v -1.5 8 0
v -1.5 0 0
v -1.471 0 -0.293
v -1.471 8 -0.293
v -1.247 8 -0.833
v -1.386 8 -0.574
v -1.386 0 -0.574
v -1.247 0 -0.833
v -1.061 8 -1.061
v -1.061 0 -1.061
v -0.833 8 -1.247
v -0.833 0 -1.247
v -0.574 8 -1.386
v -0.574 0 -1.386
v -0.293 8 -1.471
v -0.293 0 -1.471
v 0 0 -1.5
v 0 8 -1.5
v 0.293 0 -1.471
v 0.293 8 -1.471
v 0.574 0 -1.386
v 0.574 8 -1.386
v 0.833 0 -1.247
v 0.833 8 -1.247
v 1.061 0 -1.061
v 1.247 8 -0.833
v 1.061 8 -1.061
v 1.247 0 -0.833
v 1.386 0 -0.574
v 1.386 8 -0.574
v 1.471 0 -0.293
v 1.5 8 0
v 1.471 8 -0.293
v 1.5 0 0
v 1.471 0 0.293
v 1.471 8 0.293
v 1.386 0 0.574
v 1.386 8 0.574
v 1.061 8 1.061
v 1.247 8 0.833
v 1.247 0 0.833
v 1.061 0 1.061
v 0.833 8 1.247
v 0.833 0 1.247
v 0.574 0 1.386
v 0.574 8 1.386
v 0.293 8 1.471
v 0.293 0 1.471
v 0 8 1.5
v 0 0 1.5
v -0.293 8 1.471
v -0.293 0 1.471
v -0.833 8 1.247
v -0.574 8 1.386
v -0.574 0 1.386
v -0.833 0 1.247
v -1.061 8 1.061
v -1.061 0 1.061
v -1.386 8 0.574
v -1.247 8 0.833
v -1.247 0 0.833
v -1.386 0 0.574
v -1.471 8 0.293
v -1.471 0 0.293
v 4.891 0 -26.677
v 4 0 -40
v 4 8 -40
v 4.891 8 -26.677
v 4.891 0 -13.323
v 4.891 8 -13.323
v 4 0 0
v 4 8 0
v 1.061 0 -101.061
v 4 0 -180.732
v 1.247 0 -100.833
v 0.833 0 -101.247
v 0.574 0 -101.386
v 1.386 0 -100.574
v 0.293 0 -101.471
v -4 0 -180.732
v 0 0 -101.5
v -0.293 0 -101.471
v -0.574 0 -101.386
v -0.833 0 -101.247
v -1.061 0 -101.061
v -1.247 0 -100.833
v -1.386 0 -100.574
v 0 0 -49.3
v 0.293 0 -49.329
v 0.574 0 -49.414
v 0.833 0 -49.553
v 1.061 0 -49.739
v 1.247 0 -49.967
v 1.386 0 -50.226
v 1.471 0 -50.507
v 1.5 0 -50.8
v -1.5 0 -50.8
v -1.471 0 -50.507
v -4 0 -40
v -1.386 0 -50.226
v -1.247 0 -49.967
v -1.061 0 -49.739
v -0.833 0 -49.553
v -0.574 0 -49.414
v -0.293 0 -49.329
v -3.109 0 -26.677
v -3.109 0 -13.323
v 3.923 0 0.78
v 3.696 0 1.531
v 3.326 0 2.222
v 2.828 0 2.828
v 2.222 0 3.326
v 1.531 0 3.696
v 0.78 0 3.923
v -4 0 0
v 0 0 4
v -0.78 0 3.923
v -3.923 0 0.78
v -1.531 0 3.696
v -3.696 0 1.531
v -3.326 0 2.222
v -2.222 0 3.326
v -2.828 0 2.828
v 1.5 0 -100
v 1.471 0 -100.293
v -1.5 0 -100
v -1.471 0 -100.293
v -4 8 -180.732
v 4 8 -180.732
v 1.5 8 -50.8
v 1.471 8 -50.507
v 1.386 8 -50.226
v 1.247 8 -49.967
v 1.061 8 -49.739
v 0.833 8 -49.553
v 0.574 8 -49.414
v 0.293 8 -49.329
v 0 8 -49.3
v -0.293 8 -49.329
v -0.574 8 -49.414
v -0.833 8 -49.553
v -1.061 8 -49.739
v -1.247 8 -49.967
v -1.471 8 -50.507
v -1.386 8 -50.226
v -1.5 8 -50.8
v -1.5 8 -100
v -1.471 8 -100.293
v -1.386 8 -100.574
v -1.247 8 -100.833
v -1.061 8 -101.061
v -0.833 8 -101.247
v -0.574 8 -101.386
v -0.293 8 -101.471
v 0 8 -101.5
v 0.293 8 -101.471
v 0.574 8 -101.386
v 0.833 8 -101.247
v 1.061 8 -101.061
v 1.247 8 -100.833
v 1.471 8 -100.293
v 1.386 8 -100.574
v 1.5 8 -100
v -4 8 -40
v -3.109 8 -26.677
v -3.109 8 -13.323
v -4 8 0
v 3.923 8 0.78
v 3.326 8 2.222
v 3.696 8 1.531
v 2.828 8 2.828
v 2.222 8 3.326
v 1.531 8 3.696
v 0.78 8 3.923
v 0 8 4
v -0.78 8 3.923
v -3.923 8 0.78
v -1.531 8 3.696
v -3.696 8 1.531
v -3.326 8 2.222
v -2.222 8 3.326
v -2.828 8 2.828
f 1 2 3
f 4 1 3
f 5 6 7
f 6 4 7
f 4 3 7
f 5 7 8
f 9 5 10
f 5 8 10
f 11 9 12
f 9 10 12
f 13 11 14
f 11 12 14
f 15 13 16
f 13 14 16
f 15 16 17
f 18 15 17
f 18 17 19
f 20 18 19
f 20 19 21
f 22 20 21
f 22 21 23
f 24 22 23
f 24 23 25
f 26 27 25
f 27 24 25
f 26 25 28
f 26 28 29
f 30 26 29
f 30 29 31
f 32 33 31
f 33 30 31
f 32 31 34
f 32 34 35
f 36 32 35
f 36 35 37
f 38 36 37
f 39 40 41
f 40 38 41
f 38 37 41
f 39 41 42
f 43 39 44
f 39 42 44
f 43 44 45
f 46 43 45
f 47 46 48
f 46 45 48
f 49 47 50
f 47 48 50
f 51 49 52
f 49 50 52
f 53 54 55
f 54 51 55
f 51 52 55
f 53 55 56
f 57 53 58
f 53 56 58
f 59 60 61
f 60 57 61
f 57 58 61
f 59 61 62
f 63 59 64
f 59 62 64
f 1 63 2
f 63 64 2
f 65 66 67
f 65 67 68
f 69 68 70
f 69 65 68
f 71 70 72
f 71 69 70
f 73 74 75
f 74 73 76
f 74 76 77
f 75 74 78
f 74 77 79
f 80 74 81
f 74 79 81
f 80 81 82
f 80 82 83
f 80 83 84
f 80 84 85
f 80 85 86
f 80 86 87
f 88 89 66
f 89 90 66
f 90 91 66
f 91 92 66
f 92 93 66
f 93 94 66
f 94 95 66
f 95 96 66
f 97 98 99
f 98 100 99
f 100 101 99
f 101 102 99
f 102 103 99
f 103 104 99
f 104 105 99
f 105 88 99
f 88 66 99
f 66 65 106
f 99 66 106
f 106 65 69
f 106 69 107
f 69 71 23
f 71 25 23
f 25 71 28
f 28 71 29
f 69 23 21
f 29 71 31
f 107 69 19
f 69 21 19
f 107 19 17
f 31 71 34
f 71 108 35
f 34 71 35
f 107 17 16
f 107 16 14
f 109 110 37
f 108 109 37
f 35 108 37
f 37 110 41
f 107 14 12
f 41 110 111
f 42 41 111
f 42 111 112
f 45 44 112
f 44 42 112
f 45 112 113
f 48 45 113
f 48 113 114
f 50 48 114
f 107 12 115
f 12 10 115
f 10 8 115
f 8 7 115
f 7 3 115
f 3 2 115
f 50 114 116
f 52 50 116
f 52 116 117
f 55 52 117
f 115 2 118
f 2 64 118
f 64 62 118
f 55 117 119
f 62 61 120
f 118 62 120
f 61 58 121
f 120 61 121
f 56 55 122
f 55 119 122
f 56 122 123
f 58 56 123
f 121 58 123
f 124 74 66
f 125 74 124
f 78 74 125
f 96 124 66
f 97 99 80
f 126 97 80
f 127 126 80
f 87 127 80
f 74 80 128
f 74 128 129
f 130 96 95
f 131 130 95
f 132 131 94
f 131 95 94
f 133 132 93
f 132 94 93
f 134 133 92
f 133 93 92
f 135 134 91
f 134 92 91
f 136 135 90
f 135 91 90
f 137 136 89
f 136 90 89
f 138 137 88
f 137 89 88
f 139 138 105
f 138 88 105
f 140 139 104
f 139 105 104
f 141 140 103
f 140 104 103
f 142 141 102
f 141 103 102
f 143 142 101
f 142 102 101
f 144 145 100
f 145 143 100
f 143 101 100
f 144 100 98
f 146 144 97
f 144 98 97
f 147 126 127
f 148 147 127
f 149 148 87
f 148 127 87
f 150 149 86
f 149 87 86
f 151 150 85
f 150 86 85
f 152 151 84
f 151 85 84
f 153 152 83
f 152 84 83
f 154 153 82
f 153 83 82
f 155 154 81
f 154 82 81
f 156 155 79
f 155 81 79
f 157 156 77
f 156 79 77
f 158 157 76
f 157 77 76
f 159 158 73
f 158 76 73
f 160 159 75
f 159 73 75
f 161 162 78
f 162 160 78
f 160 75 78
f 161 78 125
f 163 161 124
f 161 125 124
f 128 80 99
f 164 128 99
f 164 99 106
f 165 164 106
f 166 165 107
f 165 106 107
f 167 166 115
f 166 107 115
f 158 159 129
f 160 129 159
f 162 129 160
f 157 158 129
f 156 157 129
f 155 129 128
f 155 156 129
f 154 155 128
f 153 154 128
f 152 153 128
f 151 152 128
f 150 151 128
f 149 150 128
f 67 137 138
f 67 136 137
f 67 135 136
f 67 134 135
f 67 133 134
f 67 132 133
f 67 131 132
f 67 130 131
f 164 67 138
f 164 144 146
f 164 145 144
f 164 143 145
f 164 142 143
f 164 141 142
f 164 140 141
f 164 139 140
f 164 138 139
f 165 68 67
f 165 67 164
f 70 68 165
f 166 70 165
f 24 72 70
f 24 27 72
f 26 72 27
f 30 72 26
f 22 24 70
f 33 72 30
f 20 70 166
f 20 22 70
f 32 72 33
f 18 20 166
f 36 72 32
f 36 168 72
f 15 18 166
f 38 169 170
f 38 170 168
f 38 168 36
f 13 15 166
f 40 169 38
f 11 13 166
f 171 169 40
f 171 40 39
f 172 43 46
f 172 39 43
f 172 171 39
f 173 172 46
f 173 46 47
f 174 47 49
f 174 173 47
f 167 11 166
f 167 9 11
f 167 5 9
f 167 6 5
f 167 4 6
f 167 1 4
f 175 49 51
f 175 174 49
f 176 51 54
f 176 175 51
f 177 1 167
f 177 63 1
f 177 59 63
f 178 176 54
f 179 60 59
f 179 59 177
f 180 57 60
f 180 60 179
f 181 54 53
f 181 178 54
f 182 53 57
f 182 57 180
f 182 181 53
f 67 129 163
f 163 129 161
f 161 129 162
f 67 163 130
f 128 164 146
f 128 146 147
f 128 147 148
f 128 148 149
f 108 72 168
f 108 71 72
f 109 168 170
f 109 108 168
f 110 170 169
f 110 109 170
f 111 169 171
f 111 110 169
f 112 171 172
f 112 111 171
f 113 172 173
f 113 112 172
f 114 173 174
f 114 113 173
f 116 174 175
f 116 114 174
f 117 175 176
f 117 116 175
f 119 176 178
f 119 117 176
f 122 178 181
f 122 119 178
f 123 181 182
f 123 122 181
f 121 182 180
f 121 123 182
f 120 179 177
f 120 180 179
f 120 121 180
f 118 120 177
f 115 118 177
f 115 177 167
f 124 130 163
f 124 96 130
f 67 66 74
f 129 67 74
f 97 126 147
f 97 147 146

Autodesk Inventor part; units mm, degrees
ref_plane "XZ Plane" through (0, 0, 0) normal (0, 1, 0) x (-1, 0, 0)
ref_plane "XY Plane" through (0, 0, 0) normal (0, 0, 1) x (1, 0, 0)
sketch "Sketch1" plane through (0, 0, 0) normal (0, 1, 0) x (-1, 0, 0)
  line L0 (0, 0) -> (0, -319.927) construction
  line L1 (-4, 0) -> (-4, -319.927)
  line L2 (4, -319.927) -> (4, 0)
  arc A0 (4, 0) -> (-4, 0) centre (0, 0) ccw
  arc A1 (-4, -319.927) -> (4, -319.927) centre (0, -319.927) ccw
  circle A2 centre (0, 0) radius 1.5
  circle A3 centre (0, -319.927) radius 1.5
  line L3 (0, -50.8) -> (0, -100) construction
  line L4 (-1.5, -50.8) -> (-1.5, -100)
  line L5 (1.5, -100) -> (1.5, -50.8)
  arc A4 (1.5, -50.8) -> (-1.5, -50.8) centre (0, -50.8) ccw
  arc A5 (-1.5, -100) -> (1.5, -100) centre (0, -100) ccw
  arc A6 (4, 0) -> (4, -40) centre (202.9975, -20) ccw
  arc A7 (-4, 0) -> (-4, -40) centre (194.9975, -20) ccw
  point P0 (0, -159.9635)
  point P1 (0, -75.4)
  dimension "d0" = 319.927
  dimension "d1" = 8
  dimension "d2" = 3
  dimension "d3" = 3
  dimension "d12" = 3
  dimension "d13" = 50.8
  dimension "d14" = 100
  dimension "d15" = 40
  dimension "d16" = 200
  dimension "d17" = 200
extrude "Extrusion1" add sketch "Sketch1" along normal blind 8 contours A0 A6 L2 A1 L1 | L1 A7
sketch "Sketch2" plane through (0, 0, 0) normal (0, -1, 0) x (1, 0, 0)
  arc A0 (4, -40) -> (4, 0) centre (-194.9975, -20) ccw projected
  arc A1 (4, 0) -> (-4, 0) centre (0, 0) ccw projected
  arc A2 (-4, -40) -> (-4, 0) centre (-202.9975, -20) ccw projected
  line L0 (-4, -319.927) -> (-4, -40) projected
  arc A3 (-4, -319.927) -> (4, -319.927) centre (0, -319.927) ccw projected
  line L1 (4, -40) -> (4, -319.927) projected
  circle A4 centre (0, 0) radius 1.5 projected
  circle A5 centre (0, -319.927) radius 1.5 projected
  arc A6 (1.5, -50.8) -> (-1.5, -50.8) centre (0, -50.8) ccw projected
  line L2 (1.5, -100) -> (1.5, -50.8) projected
  arc A7 (-1.5, -100) -> (1.5, -100) centre (0, -100) ccw projected
  line L3 (-1.5, -50.8) -> (-1.5, -100) projected
sketch "Sketch3" plane through (0, 8, 0) normal (0, 1, 0) x (1, 0, 0)
  line L0 (-21.634, 180.7321) -> (39.8396, 180.7321)
  line L1 (39.8396, 180.7321) -> (39.8396, -20.7362)
  line L2 (39.8396, -20.7362) -> (-21.634, -20.7362)
  line L3 (-21.634, -20.7362) -> (-21.634, 180.7321)
  line L4 (-50.5628, 342.9399) -> (62.0528, 342.9399)
  line L5 (62.0528, 342.9399) -> (62.0528, -55.3474)
  line L6 (62.0528, -55.3474) -> (-50.5628, -55.3474)
  line L7 (-50.5628, -55.3474) -> (-50.5628, 342.9399)
  point P0 (0, 0)
extrude "Extrusion2" cut sketch "Sketch3" along normal mid plane 20
sketch "Sketch4" plane through (0, 8, 0) normal (0, 1, 0) x (1, 0, 0)
  line L0 (4, 180.7321) -> (-4, 180.7321) projected
  line L1 (-4, 180.7321) -> (-4, 40) projected
  arc A0 (-4, 0) -> (-4, 40) centre (-202.9975, 20) ccw projected
  arc A1 (-4, 0) -> (4, 0) centre (0, 0) ccw projected
  arc A2 (4, 0) -> (4, 40) centre (-194.9975, 20) ccw projected
  line L2 (4, 40) -> (4, 180.7321) projected
  circle A3 centre (0, 0) radius 1.5 projected
  arc A4 (-1.5, 50.8) -> (1.5, 50.8) centre (0, 50.8) ccw projected
  line L3 (-1.5, 50.8) -> (-1.5, 100) projected
  arc A5 (1.5, 100) -> (-1.5, 100) centre (0, 100) ccw projected
  line L4 (1.5, 100) -> (1.5, 50.8) projected
properties part number "Part_8_p1"
